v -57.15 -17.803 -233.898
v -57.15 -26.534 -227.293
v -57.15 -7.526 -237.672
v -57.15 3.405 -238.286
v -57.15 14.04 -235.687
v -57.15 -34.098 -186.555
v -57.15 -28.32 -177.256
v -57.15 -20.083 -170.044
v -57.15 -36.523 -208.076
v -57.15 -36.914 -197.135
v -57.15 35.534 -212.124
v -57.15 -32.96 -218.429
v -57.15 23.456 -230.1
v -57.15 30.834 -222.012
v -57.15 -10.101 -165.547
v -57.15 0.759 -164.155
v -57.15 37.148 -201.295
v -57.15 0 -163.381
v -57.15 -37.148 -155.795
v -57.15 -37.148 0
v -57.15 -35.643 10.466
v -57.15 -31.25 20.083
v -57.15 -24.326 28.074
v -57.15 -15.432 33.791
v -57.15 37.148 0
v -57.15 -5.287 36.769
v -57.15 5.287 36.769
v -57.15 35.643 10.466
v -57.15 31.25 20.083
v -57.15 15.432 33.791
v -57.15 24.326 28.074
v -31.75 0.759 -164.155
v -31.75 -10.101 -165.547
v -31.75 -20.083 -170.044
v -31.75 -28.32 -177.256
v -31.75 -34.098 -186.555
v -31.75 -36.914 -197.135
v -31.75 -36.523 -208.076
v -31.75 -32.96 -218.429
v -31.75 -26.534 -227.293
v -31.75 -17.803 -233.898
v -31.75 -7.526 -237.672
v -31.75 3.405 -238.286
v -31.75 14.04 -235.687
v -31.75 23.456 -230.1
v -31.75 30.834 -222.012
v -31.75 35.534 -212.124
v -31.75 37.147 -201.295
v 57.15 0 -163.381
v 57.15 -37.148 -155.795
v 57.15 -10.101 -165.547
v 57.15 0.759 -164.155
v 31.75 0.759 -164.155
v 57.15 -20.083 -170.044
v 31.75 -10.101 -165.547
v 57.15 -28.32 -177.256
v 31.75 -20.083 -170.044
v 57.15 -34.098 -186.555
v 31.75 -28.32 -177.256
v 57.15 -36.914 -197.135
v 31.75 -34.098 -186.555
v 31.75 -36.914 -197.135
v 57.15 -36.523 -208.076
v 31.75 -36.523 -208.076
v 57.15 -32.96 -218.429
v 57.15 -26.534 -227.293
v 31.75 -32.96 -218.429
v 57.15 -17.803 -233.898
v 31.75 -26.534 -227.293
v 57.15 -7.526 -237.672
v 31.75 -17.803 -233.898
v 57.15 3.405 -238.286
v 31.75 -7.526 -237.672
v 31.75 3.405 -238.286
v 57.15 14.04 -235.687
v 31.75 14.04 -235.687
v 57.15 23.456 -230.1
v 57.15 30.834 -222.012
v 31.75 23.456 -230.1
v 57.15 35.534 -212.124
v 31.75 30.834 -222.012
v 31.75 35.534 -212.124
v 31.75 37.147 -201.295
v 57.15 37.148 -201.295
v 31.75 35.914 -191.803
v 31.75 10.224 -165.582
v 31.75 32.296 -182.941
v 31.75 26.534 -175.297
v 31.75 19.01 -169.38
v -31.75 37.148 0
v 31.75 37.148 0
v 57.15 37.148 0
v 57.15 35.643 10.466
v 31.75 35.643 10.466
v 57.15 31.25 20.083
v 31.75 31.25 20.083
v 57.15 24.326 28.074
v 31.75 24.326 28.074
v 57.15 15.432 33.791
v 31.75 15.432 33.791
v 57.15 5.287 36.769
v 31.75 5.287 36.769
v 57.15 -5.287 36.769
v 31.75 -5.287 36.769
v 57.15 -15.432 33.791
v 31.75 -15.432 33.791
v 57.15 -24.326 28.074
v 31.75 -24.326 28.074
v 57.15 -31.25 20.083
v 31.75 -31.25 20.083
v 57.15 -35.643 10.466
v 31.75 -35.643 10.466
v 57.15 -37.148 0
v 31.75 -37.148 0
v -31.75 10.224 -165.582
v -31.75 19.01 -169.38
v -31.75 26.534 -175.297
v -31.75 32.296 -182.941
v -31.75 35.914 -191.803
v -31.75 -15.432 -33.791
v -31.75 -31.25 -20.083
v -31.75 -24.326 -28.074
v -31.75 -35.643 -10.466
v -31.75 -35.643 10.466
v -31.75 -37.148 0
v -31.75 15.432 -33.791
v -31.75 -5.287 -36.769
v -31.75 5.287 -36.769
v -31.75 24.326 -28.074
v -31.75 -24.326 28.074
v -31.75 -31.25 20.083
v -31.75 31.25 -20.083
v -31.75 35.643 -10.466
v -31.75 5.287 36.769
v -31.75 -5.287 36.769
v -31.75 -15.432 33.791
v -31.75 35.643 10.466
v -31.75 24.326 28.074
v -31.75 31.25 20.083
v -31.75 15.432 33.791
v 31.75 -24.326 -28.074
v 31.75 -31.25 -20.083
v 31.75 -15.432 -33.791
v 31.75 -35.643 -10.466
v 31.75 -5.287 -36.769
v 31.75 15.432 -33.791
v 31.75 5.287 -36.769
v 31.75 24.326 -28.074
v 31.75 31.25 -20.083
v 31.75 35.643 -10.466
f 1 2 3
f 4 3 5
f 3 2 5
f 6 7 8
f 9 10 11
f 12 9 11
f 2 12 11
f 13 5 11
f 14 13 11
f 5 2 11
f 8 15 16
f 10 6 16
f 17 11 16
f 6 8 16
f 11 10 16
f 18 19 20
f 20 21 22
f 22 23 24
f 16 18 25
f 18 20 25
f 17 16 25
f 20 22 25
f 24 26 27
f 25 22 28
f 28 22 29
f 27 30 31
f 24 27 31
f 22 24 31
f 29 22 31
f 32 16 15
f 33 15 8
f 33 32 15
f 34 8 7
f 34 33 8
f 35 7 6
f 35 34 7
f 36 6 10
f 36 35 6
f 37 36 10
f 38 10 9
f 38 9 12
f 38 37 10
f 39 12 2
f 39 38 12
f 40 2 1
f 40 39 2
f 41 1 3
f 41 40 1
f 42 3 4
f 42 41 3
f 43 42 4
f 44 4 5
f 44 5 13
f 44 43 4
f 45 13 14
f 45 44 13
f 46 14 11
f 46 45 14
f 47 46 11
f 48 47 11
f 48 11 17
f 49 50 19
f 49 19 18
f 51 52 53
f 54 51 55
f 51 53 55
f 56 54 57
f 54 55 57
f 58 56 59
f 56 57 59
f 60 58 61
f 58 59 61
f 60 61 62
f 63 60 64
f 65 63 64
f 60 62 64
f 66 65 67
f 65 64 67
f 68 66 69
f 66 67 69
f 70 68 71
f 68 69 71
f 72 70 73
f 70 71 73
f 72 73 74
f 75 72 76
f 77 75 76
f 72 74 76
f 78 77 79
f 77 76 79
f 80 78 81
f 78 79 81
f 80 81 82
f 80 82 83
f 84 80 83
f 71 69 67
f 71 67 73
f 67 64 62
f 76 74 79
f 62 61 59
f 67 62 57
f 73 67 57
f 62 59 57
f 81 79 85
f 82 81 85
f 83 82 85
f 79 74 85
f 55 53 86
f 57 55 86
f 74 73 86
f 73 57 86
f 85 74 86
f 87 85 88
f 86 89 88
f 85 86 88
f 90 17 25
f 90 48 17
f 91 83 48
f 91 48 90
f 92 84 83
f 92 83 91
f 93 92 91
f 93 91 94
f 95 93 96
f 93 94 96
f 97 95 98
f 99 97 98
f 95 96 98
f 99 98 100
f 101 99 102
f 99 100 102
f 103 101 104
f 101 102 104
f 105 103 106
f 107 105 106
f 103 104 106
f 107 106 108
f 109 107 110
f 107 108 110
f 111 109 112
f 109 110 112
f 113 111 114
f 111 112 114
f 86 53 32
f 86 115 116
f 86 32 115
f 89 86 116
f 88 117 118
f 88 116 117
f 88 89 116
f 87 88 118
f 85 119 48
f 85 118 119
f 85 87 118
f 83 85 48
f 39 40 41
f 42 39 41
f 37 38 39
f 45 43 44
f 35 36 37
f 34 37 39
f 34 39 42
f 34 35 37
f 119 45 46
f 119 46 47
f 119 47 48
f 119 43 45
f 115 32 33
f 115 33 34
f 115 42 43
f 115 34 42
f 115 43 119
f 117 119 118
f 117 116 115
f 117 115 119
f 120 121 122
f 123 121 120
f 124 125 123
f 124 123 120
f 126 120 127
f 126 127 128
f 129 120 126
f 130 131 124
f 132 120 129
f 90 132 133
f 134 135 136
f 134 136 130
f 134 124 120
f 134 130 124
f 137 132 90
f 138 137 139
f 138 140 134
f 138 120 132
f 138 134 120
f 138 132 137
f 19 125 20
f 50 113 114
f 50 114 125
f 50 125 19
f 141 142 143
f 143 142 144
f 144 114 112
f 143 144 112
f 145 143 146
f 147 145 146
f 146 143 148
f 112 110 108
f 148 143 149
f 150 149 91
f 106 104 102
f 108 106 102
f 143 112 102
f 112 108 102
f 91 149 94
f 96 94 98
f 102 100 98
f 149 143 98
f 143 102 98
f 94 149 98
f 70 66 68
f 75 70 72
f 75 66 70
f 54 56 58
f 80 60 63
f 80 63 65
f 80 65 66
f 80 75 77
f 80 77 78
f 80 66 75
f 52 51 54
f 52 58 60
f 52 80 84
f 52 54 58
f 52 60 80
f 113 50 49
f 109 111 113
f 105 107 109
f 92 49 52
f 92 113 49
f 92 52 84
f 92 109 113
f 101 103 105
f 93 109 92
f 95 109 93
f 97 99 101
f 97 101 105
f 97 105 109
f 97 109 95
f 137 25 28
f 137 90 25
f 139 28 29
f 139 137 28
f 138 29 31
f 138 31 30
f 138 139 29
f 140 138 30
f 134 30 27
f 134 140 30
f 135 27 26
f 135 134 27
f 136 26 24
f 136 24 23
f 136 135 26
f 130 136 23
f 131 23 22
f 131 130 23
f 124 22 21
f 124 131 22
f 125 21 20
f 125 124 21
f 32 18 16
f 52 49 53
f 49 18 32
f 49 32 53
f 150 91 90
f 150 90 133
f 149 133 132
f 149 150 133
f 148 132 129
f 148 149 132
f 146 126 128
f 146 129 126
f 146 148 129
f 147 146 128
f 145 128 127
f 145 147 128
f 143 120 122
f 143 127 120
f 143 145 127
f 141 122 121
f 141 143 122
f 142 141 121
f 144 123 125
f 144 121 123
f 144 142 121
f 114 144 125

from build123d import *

# Parameters (mm, degrees)
F1_DEPTH = 57.15
F2_START = 31.75
F2_DEPTH = 25.4
F3_START = -31.75
F3_DEPTH = 25.4
F4_START = 31.75
F4_DEPTH = 25.4
F5_START = -31.75
F5_DEPTH = 25.4


with BuildPart() as f1:
    # F0 (on Right) → F1 (new body, symmetric)
    with BuildSketch(Plane.YZ):
        with BuildLine():
            Line((37.1475, -74.295), (37.1475, 0))
            ThreePointArc((37.1475, 0), (0, -37.1475), (-37.1475, 0))
            Line((-37.1475, 0), (-37.1475, -74.295))
            Line((-37.1475, -74.295), (37.1475, -74.295))
        make_face()
        with BuildLine():
            Line((37.1475, -201.295), (37.1475, -74.295))
            Line((37.1475, -74.295), (-37.1475, -74.295))
            Line((-37.1475, -74.295), (-37.1475, -155.7949632406))
            Line((-37.1475, -155.7949632406), (0, -163.3808536928))
            Line((0, -163.3808536928), (0.7587369735, -164.1552494024))
            ThreePointArc((0.7587369735, -164.1552494024), (26.5341472255, -175.2973888162), (37.1475, -201.295))
        make_face()
    extrude(amount=F1_DEPTH, both=True)

    # F0 (on Right) → F2 (join)
    with BuildSketch(Plane.YZ.offset(F2_START)):
        with BuildLine():
            Line((-37.1475, 0), (37.1475, 0))
            ThreePointArc((37.1475, 0), (0, 37.1475), (-37.1475, 0))
        make_face()
        with BuildLine():
            ThreePointArc((-37.1475, 0), (0, -37.1475), (37.1475, 0))
            Line((37.1475, 0), (-37.1475, 0))
        make_face()
    extrude(amount=F2_DEPTH)

    # F0 (on Right) → F3 (join)
    with BuildSketch(Plane.YZ.offset(F3_START)):
        with BuildLine():
            Line((-37.1475, 0), (37.1475, 0))
            ThreePointArc((37.1475, 0), (0, 37.1475), (-37.1475, 0))
        make_face()
        with BuildLine():
            ThreePointArc((-37.1475, 0), (0, -37.1475), (37.1475, 0))
            Line((37.1475, 0), (-37.1475, 0))
        make_face()
    extrude(amount=-F3_DEPTH)

    # F0 (on Right) → F4 (join)
    with BuildSketch(Plane.YZ.offset(F4_START)):
        with BuildLine():
            Line((-37.1475, -201.295), (37.1475, -201.295))
            Line((37.1475, -201.295), (0.7587369735, -164.1552494024))
            ThreePointArc((0.7587369735, -164.1552494024), (-25.9976111838, -174.7608527745), (-37.1475, -201.295))
        make_face()
        with BuildLine():
            ThreePointArc((-37.1475, -201.295), (0, -238.4425), (37.1475, -201.295))
            Line((37.1475, -201.295), (-37.1475, -201.295))
        make_face()
        with BuildLine():
            Line((0.7587369735, -164.1552494024), (37.1475, -201.295))
            ThreePointArc((37.1475, -201.295), (26.5341472255, -175.2973888162), (0.7587369735, -164.1552494024))
        make_face()
    extrude(amount=F4_DEPTH)

    # F0 (on Right) → F5 (join)
    with BuildSketch(Plane.YZ.offset(F5_START)):
        with BuildLine():
            Line((-37.1475, -201.295), (37.1475, -201.295))
            Line((37.1475, -201.295), (0.7587369735, -164.1552494024))
            ThreePointArc((0.7587369735, -164.1552494024), (-25.9976111838, -174.7608527745), (-37.1475, -201.295))
        make_face()
        with BuildLine():
            ThreePointArc((-37.1475, -201.295), (0, -238.4425), (37.1475, -201.295))
            Line((37.1475, -201.295), (-37.1475, -201.295))
        make_face()
        with BuildLine():
            Line((0.7587369735, -164.1552494024), (37.1475, -201.295))
            ThreePointArc((37.1475, -201.295), (26.5341472255, -175.2973888162), (0.7587369735, -164.1552494024))
        make_face()
    extrude(amount=-F5_DEPTH)


solid = f1.part
